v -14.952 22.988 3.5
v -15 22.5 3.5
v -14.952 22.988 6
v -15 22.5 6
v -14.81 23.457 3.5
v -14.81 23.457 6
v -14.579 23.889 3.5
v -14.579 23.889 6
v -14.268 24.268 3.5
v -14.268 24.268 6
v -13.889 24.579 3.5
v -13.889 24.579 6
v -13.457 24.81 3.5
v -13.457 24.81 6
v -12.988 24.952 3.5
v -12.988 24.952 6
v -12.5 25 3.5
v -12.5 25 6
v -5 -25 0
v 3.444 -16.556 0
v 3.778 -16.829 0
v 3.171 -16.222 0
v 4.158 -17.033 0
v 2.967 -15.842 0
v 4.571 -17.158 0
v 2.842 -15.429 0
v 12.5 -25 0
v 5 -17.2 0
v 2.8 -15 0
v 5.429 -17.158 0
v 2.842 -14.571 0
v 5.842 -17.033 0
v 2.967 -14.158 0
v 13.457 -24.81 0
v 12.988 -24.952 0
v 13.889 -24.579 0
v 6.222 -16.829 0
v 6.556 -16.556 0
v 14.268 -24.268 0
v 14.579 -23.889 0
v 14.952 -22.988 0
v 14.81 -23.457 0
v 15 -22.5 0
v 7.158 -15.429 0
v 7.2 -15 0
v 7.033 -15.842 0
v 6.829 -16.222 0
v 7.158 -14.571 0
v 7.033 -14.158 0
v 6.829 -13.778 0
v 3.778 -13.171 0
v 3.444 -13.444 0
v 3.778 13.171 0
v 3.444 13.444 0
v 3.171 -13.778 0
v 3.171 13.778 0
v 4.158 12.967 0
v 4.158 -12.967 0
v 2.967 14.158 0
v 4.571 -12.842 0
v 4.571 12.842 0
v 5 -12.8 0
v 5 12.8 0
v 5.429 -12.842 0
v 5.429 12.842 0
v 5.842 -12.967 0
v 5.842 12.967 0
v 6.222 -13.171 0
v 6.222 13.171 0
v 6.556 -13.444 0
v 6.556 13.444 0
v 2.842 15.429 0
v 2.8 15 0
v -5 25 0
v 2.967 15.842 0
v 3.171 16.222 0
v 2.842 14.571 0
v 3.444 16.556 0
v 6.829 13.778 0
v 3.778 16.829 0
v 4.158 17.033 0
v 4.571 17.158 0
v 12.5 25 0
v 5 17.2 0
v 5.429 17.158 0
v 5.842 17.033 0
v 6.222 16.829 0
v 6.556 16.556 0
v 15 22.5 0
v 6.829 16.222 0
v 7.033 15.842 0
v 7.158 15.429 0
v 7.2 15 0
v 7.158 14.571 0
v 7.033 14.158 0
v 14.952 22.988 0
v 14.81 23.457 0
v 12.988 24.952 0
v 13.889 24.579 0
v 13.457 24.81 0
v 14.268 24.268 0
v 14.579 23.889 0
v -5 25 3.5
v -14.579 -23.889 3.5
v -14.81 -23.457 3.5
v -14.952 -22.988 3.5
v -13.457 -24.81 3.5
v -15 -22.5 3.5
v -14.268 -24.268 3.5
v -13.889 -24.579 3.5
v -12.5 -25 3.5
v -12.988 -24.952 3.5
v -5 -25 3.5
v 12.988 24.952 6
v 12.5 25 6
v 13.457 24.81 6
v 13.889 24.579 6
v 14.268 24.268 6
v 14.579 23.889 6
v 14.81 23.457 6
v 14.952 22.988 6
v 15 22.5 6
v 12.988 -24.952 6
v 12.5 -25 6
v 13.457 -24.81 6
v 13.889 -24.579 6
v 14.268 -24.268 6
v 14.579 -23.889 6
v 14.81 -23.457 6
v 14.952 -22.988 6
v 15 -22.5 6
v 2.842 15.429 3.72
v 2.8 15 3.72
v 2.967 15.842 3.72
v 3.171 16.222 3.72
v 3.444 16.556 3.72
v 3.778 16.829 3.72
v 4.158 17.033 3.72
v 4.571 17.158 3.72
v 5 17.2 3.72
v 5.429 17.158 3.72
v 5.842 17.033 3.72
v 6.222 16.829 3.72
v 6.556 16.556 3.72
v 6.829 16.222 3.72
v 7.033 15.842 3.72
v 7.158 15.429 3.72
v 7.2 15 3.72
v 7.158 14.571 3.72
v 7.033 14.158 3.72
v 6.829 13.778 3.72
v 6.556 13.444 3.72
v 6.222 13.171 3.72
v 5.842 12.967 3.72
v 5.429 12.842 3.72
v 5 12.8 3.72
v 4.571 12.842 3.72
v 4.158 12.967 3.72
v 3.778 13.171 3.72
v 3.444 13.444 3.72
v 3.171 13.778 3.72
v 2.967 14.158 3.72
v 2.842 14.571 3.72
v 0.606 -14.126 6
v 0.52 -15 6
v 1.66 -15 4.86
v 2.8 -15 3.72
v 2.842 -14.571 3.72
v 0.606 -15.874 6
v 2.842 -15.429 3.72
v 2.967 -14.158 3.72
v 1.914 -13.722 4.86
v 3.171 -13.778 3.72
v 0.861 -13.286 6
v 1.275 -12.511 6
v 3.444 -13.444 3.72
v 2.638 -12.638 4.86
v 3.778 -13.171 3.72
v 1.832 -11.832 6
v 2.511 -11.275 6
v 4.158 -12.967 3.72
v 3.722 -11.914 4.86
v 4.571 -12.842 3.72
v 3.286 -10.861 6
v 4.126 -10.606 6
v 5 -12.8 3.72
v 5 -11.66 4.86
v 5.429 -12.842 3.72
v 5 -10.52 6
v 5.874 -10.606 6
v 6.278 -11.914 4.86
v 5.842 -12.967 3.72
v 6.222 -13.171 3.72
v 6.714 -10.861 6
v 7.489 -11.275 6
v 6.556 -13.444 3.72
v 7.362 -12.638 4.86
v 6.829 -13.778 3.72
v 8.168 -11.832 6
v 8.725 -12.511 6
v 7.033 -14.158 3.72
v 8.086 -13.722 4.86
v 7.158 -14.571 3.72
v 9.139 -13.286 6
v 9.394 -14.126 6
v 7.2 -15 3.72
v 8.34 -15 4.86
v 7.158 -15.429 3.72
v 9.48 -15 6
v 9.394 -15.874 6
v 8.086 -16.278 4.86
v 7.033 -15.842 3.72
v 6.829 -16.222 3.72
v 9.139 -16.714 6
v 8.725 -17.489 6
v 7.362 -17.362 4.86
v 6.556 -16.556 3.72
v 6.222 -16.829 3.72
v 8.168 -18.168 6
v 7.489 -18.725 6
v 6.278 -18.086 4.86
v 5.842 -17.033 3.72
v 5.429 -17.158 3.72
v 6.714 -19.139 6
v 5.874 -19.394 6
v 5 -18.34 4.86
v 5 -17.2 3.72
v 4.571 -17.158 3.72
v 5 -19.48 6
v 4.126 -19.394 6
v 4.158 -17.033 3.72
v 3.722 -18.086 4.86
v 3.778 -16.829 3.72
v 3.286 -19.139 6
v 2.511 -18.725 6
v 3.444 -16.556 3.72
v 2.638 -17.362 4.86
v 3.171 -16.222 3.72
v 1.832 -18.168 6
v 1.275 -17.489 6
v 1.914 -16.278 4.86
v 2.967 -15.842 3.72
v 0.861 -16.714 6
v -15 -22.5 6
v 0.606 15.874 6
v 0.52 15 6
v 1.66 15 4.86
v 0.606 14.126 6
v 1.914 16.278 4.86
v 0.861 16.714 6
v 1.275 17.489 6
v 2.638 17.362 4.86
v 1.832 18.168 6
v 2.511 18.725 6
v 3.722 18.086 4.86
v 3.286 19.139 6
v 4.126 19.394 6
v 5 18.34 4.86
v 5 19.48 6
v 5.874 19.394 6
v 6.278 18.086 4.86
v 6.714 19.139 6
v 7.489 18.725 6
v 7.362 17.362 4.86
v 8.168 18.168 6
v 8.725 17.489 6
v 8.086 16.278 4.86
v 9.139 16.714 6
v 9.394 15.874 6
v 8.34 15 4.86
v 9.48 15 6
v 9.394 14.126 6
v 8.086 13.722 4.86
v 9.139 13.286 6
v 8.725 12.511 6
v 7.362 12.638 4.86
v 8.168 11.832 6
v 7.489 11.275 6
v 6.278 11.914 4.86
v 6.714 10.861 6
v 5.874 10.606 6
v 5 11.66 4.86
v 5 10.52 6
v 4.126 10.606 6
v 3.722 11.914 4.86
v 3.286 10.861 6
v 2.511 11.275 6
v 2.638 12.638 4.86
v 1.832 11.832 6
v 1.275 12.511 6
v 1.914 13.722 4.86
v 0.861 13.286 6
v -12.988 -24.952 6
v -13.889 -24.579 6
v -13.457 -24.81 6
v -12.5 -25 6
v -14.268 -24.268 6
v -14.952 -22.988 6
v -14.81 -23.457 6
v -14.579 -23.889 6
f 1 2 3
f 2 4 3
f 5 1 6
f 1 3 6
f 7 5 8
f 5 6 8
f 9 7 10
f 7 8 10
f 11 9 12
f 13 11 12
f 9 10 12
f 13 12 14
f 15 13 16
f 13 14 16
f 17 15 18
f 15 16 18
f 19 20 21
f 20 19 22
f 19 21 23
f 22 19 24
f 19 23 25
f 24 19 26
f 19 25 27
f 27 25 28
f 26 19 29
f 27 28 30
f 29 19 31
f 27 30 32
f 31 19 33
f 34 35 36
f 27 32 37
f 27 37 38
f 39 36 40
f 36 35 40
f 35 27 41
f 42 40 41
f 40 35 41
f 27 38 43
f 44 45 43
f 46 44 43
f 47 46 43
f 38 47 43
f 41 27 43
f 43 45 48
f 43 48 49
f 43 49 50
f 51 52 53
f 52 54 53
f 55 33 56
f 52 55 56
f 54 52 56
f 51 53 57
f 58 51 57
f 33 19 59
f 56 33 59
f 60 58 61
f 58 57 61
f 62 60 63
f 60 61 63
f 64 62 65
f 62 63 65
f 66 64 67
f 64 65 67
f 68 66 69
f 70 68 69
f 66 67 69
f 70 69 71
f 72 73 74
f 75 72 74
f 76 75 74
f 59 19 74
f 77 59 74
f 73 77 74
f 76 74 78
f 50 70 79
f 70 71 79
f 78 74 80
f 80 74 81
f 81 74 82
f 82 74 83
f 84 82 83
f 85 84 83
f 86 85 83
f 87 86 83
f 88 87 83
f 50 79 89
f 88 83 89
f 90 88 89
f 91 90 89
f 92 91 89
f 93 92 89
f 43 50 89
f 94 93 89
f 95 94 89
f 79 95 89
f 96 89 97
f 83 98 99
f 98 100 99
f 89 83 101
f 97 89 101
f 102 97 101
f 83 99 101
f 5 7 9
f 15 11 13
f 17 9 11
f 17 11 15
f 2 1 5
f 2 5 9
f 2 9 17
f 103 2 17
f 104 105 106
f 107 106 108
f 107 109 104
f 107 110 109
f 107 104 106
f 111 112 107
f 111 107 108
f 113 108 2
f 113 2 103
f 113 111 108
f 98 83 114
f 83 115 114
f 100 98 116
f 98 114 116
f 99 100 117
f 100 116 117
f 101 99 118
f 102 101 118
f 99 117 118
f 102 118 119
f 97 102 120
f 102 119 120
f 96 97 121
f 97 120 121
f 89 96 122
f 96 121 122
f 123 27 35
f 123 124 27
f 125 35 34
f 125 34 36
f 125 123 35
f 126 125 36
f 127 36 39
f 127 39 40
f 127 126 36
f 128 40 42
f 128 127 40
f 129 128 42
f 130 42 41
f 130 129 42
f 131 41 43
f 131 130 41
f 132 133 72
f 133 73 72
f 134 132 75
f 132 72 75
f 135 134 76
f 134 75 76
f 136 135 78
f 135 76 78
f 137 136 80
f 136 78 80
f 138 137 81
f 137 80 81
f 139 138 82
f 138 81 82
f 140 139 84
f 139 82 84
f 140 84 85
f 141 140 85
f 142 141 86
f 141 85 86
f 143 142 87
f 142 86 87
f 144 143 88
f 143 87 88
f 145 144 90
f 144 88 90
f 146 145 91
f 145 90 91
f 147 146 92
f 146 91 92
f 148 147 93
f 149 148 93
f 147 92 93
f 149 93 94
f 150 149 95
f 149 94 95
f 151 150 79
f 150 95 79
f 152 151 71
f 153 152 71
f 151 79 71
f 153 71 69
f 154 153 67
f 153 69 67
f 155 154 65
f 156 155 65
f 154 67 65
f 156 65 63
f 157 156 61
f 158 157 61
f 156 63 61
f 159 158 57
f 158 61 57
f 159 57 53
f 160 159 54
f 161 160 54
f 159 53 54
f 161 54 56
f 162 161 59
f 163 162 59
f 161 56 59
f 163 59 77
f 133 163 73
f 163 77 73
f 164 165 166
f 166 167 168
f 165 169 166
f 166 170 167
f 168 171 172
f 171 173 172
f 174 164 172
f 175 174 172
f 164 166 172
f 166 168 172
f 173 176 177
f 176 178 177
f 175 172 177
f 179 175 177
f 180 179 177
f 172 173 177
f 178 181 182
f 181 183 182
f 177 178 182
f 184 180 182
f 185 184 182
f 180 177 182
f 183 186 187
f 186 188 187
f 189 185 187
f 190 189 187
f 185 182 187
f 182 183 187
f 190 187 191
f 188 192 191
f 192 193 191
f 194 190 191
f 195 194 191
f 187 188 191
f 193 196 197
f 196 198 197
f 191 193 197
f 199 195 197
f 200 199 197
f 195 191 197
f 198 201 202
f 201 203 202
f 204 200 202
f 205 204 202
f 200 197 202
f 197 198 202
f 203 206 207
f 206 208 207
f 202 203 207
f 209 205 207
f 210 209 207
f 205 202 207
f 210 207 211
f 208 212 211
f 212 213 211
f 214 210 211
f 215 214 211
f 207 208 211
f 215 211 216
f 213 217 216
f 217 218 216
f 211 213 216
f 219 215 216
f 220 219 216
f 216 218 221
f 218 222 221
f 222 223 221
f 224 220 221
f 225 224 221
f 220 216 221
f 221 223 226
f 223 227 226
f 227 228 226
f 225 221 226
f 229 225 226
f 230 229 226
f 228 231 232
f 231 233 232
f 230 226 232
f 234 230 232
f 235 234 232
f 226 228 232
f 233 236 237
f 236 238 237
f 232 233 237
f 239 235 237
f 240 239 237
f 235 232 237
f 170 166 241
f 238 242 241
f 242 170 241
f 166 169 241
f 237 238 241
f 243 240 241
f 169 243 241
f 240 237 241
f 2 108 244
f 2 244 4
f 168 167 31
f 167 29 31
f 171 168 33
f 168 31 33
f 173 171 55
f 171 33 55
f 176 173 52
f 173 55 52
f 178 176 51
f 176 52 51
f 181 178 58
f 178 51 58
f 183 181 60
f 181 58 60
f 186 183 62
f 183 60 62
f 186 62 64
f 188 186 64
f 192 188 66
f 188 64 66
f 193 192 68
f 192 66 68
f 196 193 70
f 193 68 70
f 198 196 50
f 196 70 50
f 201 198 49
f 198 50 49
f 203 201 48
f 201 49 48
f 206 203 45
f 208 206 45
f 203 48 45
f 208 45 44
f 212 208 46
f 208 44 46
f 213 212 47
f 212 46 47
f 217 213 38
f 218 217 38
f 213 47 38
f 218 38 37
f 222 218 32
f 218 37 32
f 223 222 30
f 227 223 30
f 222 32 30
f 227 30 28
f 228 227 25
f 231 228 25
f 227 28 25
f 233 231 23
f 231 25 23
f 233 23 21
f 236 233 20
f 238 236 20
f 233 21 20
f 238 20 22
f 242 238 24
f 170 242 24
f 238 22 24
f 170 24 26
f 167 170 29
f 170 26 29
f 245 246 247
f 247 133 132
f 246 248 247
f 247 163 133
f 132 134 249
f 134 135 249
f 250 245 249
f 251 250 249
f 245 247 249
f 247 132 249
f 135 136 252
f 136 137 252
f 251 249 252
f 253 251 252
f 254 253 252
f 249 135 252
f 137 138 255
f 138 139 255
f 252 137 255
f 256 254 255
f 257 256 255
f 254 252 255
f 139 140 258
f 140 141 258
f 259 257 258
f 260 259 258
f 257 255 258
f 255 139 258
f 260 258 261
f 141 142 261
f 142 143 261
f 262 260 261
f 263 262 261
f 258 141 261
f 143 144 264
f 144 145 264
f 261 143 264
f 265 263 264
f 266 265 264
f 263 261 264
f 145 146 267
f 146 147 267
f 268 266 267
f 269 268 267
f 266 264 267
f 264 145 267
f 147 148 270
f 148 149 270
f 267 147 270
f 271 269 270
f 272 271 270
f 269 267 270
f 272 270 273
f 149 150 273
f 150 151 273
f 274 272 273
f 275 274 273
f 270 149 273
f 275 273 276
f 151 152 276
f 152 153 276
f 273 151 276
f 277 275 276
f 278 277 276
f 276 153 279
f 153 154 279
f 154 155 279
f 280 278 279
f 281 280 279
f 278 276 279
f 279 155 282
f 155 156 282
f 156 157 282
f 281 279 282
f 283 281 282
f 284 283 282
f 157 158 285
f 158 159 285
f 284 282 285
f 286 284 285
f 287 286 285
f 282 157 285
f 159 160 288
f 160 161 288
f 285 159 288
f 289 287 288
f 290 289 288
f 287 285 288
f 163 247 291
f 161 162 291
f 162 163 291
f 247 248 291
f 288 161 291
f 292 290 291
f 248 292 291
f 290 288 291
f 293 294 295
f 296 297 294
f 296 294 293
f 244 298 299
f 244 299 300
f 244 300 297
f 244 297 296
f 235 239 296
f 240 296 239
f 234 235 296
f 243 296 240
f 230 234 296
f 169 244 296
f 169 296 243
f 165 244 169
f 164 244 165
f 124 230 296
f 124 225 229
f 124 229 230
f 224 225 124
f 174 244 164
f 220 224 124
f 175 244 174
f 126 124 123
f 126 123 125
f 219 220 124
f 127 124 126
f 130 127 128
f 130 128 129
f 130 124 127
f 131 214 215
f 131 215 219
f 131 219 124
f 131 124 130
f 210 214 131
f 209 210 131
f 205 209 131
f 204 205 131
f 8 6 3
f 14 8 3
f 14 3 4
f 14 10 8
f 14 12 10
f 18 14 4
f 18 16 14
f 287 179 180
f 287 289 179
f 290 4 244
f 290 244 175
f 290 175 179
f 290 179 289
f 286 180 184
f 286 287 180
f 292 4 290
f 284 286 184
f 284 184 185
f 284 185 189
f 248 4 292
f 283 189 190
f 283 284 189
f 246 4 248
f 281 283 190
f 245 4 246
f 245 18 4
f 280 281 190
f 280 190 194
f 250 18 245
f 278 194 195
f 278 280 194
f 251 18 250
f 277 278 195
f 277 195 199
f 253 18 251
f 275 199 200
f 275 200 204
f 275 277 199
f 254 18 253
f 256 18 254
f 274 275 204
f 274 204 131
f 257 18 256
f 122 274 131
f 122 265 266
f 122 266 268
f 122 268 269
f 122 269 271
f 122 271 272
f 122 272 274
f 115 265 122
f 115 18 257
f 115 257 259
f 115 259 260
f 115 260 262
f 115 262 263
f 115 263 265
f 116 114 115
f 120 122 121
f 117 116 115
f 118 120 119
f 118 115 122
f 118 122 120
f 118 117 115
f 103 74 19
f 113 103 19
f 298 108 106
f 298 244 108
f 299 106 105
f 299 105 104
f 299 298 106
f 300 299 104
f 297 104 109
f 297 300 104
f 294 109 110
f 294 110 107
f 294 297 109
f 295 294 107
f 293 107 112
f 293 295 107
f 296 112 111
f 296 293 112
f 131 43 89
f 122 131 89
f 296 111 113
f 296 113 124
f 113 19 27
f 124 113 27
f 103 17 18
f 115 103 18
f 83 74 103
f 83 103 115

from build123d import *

# Parameters (mm, degrees)
F0_W           = 30
F0_H           = 50
F1_DEPTH       = 6
F3_D           = 4.4
F3_CSINK_D     = 8.96
F3_CSINK_ANGLE = 90
F4_W           = 10
F4_H           = 50
F5_DEPTH       = 3.5
F6_R           = 2.5


with BuildPart() as f1:
    # F0 (on Top) → F1 (new body)
    with BuildSketch(Plane.XY):
        Rectangle(F0_W, F0_H)
    extrude(amount=F1_DEPTH)

    # F3 (through all)
    with Locations(Plane.XY.offset(6)):
        with Locations((5, 15), (5, -15)):
            CounterSinkHole(F3_D / 2, F3_CSINK_D / 2, counter_sink_angle=F3_CSINK_ANGLE)

    # F4 (on face) → F5 (cut)
    with BuildSketch(Plane(origin=(0, 0, 0), x_dir=(1, 0, 0), z_dir=(0, 0, -1))):
        with Locations((-10, 0)):
            Rectangle(F4_W, F4_H)
    extrude(amount=-F5_DEPTH, mode=Mode.SUBTRACT)

    # F6
    f6_edges = [f1.edges().sort_by_distance(p)[0] for p in [
        (-15, -25, 4.75),
        (15, -25, 3),
        (-15, 25, 4.75),
        (15, 25, 3),
    ]]
    fillet(f6_edges, radius=F6_R)


solid = f1.part
